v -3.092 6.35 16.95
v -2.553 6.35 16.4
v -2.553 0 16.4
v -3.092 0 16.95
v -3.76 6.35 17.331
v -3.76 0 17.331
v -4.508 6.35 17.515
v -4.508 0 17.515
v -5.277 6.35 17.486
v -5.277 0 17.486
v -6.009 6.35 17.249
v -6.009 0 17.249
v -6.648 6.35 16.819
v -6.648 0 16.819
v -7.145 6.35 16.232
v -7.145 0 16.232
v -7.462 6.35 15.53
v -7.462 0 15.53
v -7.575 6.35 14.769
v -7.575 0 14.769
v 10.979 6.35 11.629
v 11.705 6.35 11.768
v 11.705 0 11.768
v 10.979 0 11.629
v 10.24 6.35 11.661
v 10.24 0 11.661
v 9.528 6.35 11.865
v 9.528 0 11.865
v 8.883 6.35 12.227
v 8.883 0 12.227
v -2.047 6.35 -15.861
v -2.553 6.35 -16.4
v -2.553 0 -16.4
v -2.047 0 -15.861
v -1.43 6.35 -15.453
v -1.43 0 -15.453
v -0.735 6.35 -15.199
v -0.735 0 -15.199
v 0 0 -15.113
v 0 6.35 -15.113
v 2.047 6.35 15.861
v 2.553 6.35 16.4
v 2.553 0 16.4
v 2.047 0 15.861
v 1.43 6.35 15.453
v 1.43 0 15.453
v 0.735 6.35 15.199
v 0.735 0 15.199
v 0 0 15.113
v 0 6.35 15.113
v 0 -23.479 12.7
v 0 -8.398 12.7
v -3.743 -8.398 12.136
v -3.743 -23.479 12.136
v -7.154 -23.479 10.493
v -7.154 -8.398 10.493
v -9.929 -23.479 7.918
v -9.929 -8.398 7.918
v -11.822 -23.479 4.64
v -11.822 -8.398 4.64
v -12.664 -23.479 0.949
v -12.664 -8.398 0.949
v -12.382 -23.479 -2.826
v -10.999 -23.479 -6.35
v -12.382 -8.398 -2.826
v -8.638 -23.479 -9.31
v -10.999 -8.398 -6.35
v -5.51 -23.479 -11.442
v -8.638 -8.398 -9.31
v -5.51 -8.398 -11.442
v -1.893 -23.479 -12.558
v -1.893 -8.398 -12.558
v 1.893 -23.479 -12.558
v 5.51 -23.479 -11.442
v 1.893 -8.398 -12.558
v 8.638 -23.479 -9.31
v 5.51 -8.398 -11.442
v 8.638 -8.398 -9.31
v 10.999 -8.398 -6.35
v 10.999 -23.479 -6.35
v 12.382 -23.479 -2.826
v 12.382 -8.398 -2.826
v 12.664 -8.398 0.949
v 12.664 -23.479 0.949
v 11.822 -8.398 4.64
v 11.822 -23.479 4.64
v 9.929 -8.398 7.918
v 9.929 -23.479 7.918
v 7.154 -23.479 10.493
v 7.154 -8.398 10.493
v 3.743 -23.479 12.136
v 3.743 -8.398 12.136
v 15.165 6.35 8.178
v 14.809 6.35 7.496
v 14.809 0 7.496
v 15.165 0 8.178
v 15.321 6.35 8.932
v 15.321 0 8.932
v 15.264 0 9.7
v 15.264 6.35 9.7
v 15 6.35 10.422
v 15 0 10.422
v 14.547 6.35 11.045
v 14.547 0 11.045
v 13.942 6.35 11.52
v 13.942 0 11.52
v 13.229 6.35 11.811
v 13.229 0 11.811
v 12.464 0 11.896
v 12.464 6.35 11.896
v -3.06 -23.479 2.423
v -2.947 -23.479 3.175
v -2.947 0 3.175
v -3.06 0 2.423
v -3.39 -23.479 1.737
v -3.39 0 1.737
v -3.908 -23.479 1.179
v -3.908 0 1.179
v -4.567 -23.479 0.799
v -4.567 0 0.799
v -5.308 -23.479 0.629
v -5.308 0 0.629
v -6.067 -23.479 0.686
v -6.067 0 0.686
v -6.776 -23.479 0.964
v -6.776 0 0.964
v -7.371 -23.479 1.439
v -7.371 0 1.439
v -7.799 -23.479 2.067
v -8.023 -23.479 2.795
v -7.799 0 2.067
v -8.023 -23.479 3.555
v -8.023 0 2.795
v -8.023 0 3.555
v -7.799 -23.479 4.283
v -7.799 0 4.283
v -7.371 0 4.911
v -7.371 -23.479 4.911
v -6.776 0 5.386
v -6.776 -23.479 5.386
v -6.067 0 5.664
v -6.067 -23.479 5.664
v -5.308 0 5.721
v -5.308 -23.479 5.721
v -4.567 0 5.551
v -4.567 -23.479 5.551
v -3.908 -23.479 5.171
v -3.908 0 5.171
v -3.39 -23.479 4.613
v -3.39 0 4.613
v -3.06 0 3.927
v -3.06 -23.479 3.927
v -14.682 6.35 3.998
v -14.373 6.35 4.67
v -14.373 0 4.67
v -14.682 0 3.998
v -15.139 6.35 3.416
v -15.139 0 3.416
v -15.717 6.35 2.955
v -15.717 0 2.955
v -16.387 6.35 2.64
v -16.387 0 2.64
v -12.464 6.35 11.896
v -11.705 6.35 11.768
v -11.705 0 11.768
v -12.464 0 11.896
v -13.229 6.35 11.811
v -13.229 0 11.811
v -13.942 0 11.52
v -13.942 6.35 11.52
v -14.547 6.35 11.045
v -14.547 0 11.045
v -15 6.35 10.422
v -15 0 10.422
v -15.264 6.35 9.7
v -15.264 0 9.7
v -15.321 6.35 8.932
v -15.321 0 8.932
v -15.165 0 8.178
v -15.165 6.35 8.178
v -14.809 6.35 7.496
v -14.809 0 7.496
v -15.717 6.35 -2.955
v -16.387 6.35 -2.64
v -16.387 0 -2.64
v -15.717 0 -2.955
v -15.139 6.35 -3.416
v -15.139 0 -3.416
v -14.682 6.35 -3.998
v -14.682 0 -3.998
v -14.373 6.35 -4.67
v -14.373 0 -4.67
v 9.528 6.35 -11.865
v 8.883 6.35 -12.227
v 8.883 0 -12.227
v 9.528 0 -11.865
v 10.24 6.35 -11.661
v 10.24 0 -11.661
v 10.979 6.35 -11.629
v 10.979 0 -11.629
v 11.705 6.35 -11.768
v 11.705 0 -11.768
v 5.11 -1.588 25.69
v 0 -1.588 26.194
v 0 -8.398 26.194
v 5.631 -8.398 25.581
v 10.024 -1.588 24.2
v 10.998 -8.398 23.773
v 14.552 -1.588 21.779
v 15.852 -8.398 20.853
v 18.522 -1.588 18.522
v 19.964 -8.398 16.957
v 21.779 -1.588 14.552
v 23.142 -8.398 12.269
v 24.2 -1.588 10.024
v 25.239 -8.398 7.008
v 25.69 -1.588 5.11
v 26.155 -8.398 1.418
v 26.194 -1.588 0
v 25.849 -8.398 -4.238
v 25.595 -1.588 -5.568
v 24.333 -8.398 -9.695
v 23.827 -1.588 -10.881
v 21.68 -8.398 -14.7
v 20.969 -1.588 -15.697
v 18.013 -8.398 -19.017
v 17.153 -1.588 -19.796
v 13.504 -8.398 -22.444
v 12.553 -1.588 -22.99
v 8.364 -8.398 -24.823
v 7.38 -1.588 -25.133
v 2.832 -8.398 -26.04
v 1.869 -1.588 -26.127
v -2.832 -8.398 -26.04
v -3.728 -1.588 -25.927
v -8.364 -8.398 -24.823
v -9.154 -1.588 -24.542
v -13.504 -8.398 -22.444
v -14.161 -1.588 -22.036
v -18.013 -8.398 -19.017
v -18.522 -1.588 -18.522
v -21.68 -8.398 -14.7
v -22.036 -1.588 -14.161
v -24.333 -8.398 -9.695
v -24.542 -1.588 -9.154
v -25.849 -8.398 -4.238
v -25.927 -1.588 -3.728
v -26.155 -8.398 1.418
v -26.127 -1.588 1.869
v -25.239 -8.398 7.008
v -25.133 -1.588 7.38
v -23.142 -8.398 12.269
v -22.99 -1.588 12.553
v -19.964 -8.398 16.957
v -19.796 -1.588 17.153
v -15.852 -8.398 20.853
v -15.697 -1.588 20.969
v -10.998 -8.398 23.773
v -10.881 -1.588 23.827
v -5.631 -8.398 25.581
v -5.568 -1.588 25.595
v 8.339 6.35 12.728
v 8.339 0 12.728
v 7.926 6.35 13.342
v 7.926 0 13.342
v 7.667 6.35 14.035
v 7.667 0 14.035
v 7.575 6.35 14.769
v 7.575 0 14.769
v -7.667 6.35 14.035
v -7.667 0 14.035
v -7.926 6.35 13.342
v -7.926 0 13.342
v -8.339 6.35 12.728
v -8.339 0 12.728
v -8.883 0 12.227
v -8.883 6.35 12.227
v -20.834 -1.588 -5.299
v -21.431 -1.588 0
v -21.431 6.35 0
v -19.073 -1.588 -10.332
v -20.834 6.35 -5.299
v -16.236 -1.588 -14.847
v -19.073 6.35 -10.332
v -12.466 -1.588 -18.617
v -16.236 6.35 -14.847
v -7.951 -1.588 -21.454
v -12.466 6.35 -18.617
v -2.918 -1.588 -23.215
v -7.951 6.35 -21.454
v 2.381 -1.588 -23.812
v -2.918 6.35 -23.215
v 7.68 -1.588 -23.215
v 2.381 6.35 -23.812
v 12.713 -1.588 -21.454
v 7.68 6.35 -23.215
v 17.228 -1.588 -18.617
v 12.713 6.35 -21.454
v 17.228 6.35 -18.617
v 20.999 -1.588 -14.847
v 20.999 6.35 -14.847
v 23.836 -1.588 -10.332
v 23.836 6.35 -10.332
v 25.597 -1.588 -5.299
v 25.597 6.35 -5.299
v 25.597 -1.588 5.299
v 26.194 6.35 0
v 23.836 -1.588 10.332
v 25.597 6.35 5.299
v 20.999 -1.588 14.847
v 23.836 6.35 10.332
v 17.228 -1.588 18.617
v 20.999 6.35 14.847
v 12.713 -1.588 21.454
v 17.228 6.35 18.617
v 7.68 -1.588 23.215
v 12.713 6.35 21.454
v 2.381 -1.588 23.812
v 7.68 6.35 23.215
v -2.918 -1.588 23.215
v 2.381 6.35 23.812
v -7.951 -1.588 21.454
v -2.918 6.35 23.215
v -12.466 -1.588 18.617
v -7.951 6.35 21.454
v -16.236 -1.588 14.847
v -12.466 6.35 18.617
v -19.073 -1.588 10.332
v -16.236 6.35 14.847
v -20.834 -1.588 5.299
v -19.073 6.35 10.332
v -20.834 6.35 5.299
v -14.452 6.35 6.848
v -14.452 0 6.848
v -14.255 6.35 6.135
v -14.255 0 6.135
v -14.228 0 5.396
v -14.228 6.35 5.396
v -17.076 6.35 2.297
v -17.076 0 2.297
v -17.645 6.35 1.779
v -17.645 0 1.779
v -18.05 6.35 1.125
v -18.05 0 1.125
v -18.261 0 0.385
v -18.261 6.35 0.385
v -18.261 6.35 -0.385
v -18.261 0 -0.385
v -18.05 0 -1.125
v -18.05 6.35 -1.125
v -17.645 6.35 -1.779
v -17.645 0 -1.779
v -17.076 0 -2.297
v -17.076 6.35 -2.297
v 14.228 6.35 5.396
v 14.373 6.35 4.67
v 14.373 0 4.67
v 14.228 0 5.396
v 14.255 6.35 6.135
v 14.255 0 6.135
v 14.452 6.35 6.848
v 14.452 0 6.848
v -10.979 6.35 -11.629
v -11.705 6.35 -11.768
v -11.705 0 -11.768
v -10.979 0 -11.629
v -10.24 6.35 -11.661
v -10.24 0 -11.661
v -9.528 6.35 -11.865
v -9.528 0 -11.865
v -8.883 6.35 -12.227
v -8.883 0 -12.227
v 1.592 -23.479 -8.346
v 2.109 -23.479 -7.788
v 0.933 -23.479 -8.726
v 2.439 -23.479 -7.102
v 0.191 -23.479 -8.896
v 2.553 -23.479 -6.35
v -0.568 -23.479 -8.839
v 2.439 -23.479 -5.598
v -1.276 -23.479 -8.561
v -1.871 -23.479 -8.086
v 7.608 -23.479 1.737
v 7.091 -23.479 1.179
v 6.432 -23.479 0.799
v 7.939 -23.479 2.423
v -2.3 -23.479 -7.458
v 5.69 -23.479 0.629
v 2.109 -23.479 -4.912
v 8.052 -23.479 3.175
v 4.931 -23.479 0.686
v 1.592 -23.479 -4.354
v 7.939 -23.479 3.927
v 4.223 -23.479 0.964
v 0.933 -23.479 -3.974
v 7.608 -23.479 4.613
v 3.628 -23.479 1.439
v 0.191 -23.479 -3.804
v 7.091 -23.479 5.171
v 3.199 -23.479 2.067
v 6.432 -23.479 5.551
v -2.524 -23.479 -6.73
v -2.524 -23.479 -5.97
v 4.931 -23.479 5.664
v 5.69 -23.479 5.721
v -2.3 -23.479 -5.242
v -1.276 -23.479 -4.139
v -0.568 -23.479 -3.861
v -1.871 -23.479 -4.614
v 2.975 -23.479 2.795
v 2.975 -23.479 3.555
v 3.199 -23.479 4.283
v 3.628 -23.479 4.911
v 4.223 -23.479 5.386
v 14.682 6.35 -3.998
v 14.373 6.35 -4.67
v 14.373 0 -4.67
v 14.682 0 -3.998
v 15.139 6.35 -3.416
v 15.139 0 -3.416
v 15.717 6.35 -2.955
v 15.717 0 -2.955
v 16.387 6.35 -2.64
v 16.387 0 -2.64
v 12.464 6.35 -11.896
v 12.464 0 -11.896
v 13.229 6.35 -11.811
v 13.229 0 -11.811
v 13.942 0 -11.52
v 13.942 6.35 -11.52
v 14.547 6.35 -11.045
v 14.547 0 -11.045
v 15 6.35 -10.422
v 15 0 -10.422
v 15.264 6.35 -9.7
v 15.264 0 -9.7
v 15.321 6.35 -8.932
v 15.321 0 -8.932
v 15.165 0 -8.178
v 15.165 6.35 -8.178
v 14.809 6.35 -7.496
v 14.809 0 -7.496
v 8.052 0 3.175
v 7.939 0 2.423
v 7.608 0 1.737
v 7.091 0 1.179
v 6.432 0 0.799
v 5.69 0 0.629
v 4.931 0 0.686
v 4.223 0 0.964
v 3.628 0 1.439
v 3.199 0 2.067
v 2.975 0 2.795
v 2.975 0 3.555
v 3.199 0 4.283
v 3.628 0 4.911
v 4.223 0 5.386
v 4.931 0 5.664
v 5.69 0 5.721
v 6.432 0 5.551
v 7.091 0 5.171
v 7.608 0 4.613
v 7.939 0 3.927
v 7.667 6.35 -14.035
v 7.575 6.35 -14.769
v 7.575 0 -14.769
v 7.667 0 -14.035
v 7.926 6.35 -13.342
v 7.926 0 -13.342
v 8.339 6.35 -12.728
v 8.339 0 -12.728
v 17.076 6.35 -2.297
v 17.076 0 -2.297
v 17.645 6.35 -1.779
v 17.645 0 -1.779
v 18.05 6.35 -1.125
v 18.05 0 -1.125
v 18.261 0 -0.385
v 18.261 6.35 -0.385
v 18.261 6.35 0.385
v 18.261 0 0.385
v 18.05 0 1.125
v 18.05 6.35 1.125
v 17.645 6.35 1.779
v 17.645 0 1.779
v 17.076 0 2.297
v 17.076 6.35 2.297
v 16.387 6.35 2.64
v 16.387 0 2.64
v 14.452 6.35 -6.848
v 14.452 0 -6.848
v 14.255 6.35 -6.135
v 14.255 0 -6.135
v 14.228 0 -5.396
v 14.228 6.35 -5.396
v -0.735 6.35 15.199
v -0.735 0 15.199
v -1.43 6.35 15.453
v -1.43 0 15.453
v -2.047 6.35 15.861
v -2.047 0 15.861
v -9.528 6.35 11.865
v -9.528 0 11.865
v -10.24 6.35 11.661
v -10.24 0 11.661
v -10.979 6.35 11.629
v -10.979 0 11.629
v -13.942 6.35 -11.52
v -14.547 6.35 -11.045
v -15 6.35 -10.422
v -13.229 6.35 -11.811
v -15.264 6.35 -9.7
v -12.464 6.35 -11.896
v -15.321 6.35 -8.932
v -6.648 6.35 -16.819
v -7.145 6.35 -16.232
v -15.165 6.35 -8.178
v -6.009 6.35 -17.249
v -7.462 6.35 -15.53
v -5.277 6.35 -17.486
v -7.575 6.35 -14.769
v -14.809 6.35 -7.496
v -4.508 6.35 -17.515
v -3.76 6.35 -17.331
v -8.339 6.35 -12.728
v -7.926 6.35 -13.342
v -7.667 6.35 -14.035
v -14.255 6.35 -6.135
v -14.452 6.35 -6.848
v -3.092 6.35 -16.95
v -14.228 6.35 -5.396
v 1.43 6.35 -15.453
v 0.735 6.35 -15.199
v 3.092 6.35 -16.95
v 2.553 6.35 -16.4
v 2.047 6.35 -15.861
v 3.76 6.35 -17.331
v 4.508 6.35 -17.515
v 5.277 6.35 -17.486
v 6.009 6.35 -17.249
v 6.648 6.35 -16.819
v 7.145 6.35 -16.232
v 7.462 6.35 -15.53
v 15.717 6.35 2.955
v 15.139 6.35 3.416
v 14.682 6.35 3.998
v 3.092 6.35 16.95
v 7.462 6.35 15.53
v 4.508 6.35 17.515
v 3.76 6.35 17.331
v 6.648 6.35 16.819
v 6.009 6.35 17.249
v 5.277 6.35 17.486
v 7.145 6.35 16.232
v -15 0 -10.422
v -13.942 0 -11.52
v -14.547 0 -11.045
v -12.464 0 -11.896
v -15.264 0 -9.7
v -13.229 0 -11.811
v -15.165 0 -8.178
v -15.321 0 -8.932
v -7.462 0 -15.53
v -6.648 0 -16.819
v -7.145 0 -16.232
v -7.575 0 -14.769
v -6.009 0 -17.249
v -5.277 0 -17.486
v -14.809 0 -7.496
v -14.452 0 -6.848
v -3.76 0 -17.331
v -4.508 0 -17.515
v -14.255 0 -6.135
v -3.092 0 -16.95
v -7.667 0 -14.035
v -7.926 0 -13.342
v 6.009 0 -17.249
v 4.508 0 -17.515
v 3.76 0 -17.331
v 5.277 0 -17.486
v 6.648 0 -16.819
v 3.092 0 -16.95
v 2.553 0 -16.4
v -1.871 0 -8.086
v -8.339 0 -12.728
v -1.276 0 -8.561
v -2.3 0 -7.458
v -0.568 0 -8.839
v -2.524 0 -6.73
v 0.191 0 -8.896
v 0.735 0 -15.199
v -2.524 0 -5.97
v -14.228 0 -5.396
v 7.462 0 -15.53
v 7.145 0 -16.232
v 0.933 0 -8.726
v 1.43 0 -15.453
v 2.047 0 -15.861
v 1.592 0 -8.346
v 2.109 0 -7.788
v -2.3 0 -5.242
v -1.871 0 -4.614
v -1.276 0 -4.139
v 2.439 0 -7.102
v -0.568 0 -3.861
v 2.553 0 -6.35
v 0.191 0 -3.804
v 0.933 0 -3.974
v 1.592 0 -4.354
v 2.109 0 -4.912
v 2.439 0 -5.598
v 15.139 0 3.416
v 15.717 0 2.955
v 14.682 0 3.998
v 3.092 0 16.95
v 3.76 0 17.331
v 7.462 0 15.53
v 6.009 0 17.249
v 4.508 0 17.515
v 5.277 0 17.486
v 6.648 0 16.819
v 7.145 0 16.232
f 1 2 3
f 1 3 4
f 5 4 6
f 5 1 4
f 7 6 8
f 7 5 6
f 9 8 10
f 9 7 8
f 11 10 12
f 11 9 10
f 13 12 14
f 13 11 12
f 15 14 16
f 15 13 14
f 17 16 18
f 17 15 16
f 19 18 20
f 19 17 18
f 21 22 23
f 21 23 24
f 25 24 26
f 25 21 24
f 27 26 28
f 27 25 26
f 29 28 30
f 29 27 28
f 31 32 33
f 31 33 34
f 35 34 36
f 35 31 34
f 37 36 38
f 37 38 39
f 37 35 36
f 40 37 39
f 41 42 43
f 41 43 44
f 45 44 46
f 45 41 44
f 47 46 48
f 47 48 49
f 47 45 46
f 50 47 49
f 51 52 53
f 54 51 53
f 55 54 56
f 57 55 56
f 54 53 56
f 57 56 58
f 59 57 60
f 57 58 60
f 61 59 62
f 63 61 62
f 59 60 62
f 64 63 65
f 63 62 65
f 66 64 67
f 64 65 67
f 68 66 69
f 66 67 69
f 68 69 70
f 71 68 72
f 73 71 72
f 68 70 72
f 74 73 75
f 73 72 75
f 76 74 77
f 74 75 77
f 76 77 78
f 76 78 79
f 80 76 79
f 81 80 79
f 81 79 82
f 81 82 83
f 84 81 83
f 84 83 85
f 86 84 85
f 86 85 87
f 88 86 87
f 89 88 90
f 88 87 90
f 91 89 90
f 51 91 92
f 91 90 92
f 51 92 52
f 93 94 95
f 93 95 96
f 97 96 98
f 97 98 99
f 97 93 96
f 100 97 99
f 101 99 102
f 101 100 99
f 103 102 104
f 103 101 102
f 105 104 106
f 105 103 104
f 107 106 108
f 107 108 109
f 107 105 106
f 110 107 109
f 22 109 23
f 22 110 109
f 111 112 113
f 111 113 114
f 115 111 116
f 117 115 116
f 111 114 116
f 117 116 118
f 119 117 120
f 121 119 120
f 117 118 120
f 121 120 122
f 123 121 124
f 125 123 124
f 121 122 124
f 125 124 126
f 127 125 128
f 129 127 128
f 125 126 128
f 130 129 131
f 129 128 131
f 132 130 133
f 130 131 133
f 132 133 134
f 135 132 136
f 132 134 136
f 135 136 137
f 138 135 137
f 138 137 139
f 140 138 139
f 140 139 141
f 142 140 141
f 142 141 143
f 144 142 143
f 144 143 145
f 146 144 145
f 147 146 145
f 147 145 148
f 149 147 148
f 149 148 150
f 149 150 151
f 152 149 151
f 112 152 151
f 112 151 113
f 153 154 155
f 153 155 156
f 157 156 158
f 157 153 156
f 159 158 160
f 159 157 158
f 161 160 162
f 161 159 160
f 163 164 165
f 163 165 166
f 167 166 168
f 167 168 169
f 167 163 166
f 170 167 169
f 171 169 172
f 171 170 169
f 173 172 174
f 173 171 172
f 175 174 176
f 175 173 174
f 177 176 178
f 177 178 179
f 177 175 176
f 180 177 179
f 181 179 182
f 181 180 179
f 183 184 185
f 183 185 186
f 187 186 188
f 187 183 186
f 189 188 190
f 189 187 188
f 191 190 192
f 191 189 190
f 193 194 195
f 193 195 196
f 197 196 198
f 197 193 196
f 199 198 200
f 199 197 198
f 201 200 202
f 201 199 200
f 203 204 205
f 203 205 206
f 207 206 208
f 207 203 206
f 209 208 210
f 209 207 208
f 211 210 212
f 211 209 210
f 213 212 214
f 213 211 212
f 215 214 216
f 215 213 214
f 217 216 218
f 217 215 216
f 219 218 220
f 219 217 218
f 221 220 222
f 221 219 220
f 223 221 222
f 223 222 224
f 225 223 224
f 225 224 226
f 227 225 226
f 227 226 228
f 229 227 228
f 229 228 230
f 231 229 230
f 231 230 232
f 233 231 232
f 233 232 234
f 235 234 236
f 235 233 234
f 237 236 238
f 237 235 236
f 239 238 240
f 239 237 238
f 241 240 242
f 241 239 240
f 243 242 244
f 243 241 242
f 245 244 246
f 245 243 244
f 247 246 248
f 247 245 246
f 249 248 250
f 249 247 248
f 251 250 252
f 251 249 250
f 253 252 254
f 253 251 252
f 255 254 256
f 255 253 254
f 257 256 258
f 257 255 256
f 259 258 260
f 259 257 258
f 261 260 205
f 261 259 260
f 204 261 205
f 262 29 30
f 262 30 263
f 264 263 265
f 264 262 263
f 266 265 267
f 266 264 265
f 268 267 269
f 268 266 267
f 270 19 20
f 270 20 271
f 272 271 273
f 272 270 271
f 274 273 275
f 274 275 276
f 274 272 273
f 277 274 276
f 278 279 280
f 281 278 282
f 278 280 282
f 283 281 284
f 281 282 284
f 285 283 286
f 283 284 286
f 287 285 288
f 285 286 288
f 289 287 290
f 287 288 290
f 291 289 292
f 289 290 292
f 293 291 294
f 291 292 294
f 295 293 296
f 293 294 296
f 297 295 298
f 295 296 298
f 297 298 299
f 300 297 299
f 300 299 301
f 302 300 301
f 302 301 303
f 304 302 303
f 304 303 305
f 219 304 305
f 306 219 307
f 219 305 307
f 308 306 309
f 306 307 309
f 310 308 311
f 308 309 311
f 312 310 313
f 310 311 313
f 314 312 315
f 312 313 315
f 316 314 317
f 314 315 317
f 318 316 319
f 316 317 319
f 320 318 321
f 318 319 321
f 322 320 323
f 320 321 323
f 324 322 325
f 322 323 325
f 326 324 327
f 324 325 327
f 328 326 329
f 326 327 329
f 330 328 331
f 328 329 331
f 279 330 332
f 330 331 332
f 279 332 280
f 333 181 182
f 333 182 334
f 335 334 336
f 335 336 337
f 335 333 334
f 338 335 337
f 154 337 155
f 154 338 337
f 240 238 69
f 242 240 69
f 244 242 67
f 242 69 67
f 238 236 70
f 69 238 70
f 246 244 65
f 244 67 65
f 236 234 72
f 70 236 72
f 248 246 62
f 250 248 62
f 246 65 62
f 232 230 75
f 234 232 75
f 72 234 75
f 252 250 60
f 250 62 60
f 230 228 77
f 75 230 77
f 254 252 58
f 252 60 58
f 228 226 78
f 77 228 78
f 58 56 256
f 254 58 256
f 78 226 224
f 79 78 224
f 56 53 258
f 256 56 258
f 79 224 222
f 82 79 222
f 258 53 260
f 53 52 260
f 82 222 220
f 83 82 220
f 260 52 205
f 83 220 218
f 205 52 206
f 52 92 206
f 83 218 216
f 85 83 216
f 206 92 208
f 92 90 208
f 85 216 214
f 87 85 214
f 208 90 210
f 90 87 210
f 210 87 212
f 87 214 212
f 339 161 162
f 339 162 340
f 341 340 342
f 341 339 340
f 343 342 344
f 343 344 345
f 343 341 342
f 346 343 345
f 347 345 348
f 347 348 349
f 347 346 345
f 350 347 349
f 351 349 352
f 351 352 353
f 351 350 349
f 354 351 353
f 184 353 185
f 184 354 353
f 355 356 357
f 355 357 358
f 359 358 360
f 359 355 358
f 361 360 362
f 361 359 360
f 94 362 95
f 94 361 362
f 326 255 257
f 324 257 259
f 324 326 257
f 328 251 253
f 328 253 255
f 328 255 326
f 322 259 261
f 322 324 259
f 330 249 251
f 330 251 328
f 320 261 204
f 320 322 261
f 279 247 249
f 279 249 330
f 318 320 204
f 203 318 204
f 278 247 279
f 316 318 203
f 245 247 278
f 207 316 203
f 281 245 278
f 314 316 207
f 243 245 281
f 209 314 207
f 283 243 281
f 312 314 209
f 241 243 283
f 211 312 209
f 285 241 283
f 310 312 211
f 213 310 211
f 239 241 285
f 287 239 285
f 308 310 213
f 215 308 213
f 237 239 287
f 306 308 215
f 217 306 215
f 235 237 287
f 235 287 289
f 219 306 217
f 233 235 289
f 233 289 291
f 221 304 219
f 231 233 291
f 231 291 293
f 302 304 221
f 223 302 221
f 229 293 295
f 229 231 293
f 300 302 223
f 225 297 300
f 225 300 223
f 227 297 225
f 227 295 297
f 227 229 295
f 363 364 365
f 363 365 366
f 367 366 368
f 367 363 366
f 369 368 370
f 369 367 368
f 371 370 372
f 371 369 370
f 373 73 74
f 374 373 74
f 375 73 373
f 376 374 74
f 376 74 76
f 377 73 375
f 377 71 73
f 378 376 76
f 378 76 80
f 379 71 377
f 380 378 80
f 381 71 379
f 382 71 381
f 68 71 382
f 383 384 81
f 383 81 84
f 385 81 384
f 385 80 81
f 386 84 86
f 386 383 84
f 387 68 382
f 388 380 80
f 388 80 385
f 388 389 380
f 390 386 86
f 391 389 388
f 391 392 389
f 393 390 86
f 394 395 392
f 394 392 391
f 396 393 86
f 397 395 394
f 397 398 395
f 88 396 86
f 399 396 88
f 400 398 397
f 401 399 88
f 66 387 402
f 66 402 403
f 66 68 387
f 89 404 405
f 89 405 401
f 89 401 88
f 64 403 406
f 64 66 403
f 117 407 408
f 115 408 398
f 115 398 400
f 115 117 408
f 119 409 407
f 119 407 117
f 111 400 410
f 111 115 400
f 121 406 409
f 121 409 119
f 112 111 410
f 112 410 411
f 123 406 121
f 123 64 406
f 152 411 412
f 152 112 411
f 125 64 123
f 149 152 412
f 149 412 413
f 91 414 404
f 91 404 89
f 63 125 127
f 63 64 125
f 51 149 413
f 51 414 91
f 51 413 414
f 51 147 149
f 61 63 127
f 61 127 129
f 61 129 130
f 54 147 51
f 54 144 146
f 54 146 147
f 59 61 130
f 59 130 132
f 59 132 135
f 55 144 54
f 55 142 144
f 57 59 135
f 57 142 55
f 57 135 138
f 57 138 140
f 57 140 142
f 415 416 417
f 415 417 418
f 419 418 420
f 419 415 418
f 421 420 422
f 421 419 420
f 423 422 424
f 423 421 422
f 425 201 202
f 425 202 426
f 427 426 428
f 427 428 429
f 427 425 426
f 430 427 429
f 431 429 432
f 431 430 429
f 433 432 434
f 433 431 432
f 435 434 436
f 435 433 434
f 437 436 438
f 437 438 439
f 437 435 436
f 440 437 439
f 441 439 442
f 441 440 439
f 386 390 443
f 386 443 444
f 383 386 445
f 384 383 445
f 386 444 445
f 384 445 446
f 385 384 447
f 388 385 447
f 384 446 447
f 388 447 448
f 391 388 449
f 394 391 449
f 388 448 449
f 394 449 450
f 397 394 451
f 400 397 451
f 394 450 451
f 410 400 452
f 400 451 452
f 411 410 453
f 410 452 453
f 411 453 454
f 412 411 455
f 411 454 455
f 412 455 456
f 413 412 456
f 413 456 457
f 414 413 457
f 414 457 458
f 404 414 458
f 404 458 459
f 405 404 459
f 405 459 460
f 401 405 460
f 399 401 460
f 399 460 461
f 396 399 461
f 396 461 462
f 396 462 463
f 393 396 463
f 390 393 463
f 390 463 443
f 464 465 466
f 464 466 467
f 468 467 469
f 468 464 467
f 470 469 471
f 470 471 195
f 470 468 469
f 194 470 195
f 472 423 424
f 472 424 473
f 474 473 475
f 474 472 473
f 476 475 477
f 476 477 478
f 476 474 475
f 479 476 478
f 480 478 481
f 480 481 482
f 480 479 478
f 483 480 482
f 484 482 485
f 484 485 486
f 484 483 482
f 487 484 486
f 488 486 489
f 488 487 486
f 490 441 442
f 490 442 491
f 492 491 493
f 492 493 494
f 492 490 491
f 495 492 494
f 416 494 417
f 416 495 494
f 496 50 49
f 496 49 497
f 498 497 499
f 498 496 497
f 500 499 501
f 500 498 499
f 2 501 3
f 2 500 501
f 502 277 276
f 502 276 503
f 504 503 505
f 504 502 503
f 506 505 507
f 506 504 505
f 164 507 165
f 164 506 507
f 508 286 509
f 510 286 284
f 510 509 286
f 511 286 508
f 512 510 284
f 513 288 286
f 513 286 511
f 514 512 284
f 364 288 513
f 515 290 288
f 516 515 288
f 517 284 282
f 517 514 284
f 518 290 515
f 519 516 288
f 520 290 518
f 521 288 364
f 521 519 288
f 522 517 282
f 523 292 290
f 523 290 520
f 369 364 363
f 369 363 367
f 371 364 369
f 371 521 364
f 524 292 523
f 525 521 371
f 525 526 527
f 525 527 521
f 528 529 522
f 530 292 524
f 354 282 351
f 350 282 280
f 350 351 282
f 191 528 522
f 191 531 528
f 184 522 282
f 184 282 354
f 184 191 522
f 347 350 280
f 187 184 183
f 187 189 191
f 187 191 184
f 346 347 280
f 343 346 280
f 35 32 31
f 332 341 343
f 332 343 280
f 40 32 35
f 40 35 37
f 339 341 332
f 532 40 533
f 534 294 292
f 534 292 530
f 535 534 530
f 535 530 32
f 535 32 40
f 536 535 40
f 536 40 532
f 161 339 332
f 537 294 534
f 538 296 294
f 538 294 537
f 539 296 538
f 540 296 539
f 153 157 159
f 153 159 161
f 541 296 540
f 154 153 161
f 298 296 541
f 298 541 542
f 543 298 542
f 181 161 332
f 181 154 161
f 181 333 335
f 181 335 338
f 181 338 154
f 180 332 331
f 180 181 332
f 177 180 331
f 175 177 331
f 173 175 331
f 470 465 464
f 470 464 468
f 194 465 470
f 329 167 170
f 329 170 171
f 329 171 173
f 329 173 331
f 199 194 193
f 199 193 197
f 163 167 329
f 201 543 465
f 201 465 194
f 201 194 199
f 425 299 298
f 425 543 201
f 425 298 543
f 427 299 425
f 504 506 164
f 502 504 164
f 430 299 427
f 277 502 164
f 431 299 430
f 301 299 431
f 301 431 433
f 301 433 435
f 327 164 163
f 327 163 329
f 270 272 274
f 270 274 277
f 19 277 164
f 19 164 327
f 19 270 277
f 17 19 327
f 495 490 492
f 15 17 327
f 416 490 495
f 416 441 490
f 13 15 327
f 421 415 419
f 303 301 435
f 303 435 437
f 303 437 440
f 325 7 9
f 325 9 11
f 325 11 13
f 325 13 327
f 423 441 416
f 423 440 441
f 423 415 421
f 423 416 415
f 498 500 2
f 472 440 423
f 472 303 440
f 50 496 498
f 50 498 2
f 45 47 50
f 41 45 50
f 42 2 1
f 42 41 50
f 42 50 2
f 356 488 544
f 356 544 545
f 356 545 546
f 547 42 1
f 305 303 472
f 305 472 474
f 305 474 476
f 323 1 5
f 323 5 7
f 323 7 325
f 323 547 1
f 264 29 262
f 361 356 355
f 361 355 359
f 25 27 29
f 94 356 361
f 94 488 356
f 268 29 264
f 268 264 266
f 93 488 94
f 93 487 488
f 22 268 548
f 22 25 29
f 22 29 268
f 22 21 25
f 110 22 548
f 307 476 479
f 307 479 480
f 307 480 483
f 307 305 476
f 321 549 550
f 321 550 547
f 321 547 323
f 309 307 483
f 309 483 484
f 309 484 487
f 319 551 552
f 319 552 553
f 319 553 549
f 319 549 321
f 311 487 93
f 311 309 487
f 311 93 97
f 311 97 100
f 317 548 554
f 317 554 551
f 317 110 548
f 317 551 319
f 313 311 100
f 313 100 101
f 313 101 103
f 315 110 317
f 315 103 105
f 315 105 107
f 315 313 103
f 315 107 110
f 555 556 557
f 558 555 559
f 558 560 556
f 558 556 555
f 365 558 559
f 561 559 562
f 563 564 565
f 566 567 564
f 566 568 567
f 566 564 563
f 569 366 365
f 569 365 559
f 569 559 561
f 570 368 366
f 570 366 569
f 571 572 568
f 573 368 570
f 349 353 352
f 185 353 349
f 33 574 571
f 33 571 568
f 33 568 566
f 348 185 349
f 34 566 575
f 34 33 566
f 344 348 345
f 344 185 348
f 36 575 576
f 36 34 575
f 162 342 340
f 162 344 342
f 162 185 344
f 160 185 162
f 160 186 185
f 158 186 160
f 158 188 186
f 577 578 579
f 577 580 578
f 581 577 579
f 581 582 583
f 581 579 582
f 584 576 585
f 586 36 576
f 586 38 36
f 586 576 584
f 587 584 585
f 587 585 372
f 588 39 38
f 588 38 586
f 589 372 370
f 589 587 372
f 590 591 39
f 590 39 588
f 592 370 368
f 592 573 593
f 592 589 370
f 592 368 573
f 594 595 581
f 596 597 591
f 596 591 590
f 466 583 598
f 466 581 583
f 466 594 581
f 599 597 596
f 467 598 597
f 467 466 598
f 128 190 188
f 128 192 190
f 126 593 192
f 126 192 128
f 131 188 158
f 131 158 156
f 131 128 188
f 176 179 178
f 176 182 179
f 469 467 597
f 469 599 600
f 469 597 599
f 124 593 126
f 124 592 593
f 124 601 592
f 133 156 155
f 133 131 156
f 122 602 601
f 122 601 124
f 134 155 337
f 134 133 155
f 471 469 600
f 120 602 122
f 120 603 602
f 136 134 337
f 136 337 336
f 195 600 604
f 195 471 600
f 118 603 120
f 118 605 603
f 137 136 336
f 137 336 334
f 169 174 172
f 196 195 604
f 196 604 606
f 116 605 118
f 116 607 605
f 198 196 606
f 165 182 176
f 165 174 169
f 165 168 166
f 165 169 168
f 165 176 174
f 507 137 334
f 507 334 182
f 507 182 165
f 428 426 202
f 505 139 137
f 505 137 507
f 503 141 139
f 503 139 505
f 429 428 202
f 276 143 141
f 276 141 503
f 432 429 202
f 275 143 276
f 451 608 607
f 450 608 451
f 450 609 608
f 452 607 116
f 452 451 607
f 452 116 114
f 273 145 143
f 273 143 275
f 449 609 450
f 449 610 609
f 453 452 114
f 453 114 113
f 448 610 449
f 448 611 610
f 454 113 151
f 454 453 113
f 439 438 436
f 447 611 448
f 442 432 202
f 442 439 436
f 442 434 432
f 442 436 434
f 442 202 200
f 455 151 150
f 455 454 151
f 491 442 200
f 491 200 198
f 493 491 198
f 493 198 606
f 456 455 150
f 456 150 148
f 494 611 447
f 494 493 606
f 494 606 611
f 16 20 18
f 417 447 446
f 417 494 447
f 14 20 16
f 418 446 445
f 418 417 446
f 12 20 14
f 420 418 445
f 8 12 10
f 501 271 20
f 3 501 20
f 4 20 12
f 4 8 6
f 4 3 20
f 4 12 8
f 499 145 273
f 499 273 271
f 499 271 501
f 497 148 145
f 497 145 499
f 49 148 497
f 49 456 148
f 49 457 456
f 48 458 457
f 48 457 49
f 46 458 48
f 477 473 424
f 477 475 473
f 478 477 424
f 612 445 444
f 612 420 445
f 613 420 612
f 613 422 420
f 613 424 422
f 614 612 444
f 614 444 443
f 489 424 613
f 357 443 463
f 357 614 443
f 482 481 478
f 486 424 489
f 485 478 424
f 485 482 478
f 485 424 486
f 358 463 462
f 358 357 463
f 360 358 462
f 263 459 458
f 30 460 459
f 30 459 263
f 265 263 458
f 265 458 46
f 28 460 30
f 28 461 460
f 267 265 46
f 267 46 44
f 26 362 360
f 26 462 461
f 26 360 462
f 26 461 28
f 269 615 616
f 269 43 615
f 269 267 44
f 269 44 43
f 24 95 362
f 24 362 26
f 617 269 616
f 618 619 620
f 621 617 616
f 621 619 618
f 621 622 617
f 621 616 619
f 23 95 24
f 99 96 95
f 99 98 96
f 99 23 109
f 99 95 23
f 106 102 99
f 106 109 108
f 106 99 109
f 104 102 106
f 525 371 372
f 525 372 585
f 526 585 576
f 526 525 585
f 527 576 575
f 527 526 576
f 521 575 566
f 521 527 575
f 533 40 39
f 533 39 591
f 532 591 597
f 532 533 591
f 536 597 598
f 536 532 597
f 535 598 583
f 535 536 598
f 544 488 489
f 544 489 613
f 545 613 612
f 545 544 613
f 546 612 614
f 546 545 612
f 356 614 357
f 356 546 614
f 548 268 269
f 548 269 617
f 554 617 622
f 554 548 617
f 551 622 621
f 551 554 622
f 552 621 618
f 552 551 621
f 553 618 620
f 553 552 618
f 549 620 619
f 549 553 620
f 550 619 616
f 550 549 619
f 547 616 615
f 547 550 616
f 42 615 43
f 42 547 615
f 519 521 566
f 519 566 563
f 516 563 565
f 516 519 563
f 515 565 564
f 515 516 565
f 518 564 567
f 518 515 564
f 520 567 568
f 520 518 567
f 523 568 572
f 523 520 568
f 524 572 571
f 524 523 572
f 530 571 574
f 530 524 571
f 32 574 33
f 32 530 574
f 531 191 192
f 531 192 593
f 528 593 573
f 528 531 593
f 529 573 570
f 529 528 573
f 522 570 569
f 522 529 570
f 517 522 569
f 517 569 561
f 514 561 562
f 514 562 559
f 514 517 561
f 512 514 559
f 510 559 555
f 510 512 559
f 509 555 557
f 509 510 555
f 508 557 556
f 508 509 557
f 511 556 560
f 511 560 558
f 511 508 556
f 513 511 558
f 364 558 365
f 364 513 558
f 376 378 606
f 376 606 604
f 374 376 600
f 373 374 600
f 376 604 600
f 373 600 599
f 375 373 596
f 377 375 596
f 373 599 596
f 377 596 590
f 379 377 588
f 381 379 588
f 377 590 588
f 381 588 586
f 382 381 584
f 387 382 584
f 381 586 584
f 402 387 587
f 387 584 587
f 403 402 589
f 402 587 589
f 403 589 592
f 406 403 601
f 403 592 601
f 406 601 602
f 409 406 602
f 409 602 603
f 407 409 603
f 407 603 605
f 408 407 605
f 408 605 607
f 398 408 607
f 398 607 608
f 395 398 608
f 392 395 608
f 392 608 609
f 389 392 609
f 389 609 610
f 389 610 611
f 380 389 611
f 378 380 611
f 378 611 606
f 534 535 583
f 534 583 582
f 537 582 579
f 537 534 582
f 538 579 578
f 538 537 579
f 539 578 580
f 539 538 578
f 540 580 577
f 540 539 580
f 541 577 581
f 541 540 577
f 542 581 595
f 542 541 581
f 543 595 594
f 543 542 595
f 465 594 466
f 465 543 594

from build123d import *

# Parameters (mm, degrees)
SKETCH1_R               = 26.19375
BOSS_EXTRUDE1_DEPTH     = 8.397875
SKETCH2_R               = 12.7
BOSS_EXTRUDE2_DEPTH     = 15.08125
BOSS_EXTRUDE3_START     = 6.35
SKETCH3_R               = 26.19375
BOSS_EXTRUDE3_DEPTH     = 6.35
F_1_4_20_TAPPED_HOLE1_D = 5.1054
SKETCH6_W               = 66.50359939
SKETCH6_H               = 67.616646228
CUT_EXTRUDE2_DEPTH      = 7.9375


with BuildPart() as part:
    # Sketch1 → Boss-Extrude1 (new body)
    with BuildSketch(Plane(origin=(0, 0, 0), x_dir=(1, 0, 0), z_dir=(0, 1, 0))):
        with Locations(Location((0, 0, 0), (0, 0, 270))):
            Circle(SKETCH1_R)
    extrude(amount=-BOSS_EXTRUDE1_DEPTH)

    # Sketch2 → Boss-Extrude2 (add)
    with BuildSketch(Plane.XZ.offset(8.397875)):
        with Locations(Location((0, 0, 0), (0, 0, 90))):
            Circle(SKETCH2_R)
    extrude(amount=BOSS_EXTRUDE2_DEPTH)

    # Sketch3 → Boss-Extrude3 (add)
    with BuildSketch(Plane(origin=(0, 0, 0), x_dir=(1, 0, 0), z_dir=(0, 1, 0)).offset(BOSS_EXTRUDE3_START)):
        with Locations(Location((0, 0, 0), (0, 0, 270))):
            Circle(SKETCH3_R)
        with BuildLine():
            ThreePointArc((2.553003524, 16.40046245), (5.651302793, 17.39292157), (7.574526721, 14.768870658))
            ThreePointArc((7.574526721, 14.768870658), (7.926495509, 13.34211974), (8.883198518, 12.226673836))
            ThreePointArc((8.883198518, 12.226673836), (10.239688102, 11.661486946), (11.705373197, 11.767635017))
            ThreePointArc((11.705373197, 11.767635017), (14.795302793, 10.749416694), (14.808845207, 7.496072251))
            ThreePointArc((14.808845207, 7.496072251), (14.25497079, 6.134924448), (14.373317131, 4.670173836))
            ThreePointArc((14.373317131, 4.670173836), (15.138531738, 3.415603465), (16.386688159, 2.639970974))
            ThreePointArc((16.386688159, 2.639970974), (18.288, 0), (16.386688159, -2.639970974))
            ThreePointArc((16.386688159, -2.639970974), (15.138531738, -3.415603465), (14.373317131, -4.670173836))
            ThreePointArc((14.373317131, -4.670173836), (14.25497079, -6.134924448), (14.808845207, -7.496072251))
            ThreePointArc((14.808845207, -7.496072251), (14.795302793, -10.749416694), (11.705373197, -11.767635017))
            ThreePointArc((11.705373197, -11.767635017), (10.239688102, -11.661486946), (8.883198518, -12.226673836))
            ThreePointArc((8.883198518, -12.226673836), (7.926495509, -13.34211974), (7.574526721, -14.768870658))
            ThreePointArc((7.574526721, -14.768870658), (5.651302793, -17.39292157), (2.553003524, -16.40046245))
            ThreePointArc((2.553003524, -16.40046245), (1.429631644, -15.453078773), (0, -15.113))
            ThreePointArc((0, -15.113), (-1.429631644, -15.453078773), (-2.553003524, -16.40046245))
            ThreePointArc((-2.553003524, -16.40046245), (-5.651302793, -17.39292157), (-7.574526721, -14.768870658))
            ThreePointArc((-7.574526721, -14.768870658), (-7.926495509, -13.34211974), (-8.883198518, -12.226673836))
            ThreePointArc((-8.883198518, -12.226673836), (-10.239688102, -11.661486946), (-11.705373197, -11.767635017))
            ThreePointArc((-11.705373197, -11.767635017), (-14.795302793, -10.749416694), (-14.808845207, -7.496072251))
            ThreePointArc((-14.808845207, -7.496072251), (-14.25497079, -6.134924448), (-14.373317131, -4.670173836))
            ThreePointArc((-14.373317131, -4.670173836), (-15.138531738, -3.415603465), (-16.386688159, -2.639970974))
            ThreePointArc((-16.386688159, -2.639970974), (-18.288, 0), (-16.386688159, 2.639970974))
            ThreePointArc((-16.386688159, 2.639970974), (-15.138531738, 3.415603465), (-14.373317131, 4.670173836))
            ThreePointArc((-14.373317131, 4.670173836), (-14.25497079, 6.134924448), (-14.808845207, 7.496072251))
            ThreePointArc((-14.808845207, 7.496072251), (-14.795302793, 10.749416694), (-11.705373197, 11.767635017))
            ThreePointArc((-11.705373197, 11.767635017), (-10.239688102, 11.661486946), (-8.883198518, 12.226673836))
            ThreePointArc((-8.883198518, 12.226673836), (-7.926495509, 13.34211974), (-7.574526721, 14.768870658))
            ThreePointArc((-7.574526721, 14.768870658), (-5.651302793, 17.39292157), (-2.553003524, 16.40046245))
            ThreePointArc((-2.553003524, 16.40046245), (-1.429631644, 15.453078773), (0, 15.113))
            ThreePointArc((0, 15.113), (1.429631644, 15.453078773), (2.553003524, 16.40046245))
        make_face(mode=Mode.SUBTRACT)
    extrude(amount=-BOSS_EXTRUDE3_DEPTH)

    # 1/4-20 Tapped Hole1 (through all)
    with Locations(Plane(origin=(0, -23.479125, 0), x_dir=(-1, 0, 0), z_dir=(0, -1, 0))):
        with Locations((0, 6.35), (5.499261314, -3.175), (-5.499261314, -3.175)):
            Hole(F_1_4_20_TAPPED_HOLE1_D / 2)

    # Sketch6 → Cut-Extrude2 (cut)
    with BuildSketch(Plane(origin=(0, 6.35, 0), x_dir=(1, 0, 0), z_dir=(0, 1, 0))):
        Rectangle(SKETCH6_W, SKETCH6_H)
        with BuildLine():
            ThreePointArc((26.19375, 0), (2.38125, -23.8125), (-21.43125, 0))
            ThreePointArc((-21.43125, 0), (2.38125, 23.8125), (26.19375, 0))
        make_face(mode=Mode.SUBTRACT)
    extrude(amount=-CUT_EXTRUDE2_DEPTH, mode=Mode.SUBTRACT)


solid = part.part
